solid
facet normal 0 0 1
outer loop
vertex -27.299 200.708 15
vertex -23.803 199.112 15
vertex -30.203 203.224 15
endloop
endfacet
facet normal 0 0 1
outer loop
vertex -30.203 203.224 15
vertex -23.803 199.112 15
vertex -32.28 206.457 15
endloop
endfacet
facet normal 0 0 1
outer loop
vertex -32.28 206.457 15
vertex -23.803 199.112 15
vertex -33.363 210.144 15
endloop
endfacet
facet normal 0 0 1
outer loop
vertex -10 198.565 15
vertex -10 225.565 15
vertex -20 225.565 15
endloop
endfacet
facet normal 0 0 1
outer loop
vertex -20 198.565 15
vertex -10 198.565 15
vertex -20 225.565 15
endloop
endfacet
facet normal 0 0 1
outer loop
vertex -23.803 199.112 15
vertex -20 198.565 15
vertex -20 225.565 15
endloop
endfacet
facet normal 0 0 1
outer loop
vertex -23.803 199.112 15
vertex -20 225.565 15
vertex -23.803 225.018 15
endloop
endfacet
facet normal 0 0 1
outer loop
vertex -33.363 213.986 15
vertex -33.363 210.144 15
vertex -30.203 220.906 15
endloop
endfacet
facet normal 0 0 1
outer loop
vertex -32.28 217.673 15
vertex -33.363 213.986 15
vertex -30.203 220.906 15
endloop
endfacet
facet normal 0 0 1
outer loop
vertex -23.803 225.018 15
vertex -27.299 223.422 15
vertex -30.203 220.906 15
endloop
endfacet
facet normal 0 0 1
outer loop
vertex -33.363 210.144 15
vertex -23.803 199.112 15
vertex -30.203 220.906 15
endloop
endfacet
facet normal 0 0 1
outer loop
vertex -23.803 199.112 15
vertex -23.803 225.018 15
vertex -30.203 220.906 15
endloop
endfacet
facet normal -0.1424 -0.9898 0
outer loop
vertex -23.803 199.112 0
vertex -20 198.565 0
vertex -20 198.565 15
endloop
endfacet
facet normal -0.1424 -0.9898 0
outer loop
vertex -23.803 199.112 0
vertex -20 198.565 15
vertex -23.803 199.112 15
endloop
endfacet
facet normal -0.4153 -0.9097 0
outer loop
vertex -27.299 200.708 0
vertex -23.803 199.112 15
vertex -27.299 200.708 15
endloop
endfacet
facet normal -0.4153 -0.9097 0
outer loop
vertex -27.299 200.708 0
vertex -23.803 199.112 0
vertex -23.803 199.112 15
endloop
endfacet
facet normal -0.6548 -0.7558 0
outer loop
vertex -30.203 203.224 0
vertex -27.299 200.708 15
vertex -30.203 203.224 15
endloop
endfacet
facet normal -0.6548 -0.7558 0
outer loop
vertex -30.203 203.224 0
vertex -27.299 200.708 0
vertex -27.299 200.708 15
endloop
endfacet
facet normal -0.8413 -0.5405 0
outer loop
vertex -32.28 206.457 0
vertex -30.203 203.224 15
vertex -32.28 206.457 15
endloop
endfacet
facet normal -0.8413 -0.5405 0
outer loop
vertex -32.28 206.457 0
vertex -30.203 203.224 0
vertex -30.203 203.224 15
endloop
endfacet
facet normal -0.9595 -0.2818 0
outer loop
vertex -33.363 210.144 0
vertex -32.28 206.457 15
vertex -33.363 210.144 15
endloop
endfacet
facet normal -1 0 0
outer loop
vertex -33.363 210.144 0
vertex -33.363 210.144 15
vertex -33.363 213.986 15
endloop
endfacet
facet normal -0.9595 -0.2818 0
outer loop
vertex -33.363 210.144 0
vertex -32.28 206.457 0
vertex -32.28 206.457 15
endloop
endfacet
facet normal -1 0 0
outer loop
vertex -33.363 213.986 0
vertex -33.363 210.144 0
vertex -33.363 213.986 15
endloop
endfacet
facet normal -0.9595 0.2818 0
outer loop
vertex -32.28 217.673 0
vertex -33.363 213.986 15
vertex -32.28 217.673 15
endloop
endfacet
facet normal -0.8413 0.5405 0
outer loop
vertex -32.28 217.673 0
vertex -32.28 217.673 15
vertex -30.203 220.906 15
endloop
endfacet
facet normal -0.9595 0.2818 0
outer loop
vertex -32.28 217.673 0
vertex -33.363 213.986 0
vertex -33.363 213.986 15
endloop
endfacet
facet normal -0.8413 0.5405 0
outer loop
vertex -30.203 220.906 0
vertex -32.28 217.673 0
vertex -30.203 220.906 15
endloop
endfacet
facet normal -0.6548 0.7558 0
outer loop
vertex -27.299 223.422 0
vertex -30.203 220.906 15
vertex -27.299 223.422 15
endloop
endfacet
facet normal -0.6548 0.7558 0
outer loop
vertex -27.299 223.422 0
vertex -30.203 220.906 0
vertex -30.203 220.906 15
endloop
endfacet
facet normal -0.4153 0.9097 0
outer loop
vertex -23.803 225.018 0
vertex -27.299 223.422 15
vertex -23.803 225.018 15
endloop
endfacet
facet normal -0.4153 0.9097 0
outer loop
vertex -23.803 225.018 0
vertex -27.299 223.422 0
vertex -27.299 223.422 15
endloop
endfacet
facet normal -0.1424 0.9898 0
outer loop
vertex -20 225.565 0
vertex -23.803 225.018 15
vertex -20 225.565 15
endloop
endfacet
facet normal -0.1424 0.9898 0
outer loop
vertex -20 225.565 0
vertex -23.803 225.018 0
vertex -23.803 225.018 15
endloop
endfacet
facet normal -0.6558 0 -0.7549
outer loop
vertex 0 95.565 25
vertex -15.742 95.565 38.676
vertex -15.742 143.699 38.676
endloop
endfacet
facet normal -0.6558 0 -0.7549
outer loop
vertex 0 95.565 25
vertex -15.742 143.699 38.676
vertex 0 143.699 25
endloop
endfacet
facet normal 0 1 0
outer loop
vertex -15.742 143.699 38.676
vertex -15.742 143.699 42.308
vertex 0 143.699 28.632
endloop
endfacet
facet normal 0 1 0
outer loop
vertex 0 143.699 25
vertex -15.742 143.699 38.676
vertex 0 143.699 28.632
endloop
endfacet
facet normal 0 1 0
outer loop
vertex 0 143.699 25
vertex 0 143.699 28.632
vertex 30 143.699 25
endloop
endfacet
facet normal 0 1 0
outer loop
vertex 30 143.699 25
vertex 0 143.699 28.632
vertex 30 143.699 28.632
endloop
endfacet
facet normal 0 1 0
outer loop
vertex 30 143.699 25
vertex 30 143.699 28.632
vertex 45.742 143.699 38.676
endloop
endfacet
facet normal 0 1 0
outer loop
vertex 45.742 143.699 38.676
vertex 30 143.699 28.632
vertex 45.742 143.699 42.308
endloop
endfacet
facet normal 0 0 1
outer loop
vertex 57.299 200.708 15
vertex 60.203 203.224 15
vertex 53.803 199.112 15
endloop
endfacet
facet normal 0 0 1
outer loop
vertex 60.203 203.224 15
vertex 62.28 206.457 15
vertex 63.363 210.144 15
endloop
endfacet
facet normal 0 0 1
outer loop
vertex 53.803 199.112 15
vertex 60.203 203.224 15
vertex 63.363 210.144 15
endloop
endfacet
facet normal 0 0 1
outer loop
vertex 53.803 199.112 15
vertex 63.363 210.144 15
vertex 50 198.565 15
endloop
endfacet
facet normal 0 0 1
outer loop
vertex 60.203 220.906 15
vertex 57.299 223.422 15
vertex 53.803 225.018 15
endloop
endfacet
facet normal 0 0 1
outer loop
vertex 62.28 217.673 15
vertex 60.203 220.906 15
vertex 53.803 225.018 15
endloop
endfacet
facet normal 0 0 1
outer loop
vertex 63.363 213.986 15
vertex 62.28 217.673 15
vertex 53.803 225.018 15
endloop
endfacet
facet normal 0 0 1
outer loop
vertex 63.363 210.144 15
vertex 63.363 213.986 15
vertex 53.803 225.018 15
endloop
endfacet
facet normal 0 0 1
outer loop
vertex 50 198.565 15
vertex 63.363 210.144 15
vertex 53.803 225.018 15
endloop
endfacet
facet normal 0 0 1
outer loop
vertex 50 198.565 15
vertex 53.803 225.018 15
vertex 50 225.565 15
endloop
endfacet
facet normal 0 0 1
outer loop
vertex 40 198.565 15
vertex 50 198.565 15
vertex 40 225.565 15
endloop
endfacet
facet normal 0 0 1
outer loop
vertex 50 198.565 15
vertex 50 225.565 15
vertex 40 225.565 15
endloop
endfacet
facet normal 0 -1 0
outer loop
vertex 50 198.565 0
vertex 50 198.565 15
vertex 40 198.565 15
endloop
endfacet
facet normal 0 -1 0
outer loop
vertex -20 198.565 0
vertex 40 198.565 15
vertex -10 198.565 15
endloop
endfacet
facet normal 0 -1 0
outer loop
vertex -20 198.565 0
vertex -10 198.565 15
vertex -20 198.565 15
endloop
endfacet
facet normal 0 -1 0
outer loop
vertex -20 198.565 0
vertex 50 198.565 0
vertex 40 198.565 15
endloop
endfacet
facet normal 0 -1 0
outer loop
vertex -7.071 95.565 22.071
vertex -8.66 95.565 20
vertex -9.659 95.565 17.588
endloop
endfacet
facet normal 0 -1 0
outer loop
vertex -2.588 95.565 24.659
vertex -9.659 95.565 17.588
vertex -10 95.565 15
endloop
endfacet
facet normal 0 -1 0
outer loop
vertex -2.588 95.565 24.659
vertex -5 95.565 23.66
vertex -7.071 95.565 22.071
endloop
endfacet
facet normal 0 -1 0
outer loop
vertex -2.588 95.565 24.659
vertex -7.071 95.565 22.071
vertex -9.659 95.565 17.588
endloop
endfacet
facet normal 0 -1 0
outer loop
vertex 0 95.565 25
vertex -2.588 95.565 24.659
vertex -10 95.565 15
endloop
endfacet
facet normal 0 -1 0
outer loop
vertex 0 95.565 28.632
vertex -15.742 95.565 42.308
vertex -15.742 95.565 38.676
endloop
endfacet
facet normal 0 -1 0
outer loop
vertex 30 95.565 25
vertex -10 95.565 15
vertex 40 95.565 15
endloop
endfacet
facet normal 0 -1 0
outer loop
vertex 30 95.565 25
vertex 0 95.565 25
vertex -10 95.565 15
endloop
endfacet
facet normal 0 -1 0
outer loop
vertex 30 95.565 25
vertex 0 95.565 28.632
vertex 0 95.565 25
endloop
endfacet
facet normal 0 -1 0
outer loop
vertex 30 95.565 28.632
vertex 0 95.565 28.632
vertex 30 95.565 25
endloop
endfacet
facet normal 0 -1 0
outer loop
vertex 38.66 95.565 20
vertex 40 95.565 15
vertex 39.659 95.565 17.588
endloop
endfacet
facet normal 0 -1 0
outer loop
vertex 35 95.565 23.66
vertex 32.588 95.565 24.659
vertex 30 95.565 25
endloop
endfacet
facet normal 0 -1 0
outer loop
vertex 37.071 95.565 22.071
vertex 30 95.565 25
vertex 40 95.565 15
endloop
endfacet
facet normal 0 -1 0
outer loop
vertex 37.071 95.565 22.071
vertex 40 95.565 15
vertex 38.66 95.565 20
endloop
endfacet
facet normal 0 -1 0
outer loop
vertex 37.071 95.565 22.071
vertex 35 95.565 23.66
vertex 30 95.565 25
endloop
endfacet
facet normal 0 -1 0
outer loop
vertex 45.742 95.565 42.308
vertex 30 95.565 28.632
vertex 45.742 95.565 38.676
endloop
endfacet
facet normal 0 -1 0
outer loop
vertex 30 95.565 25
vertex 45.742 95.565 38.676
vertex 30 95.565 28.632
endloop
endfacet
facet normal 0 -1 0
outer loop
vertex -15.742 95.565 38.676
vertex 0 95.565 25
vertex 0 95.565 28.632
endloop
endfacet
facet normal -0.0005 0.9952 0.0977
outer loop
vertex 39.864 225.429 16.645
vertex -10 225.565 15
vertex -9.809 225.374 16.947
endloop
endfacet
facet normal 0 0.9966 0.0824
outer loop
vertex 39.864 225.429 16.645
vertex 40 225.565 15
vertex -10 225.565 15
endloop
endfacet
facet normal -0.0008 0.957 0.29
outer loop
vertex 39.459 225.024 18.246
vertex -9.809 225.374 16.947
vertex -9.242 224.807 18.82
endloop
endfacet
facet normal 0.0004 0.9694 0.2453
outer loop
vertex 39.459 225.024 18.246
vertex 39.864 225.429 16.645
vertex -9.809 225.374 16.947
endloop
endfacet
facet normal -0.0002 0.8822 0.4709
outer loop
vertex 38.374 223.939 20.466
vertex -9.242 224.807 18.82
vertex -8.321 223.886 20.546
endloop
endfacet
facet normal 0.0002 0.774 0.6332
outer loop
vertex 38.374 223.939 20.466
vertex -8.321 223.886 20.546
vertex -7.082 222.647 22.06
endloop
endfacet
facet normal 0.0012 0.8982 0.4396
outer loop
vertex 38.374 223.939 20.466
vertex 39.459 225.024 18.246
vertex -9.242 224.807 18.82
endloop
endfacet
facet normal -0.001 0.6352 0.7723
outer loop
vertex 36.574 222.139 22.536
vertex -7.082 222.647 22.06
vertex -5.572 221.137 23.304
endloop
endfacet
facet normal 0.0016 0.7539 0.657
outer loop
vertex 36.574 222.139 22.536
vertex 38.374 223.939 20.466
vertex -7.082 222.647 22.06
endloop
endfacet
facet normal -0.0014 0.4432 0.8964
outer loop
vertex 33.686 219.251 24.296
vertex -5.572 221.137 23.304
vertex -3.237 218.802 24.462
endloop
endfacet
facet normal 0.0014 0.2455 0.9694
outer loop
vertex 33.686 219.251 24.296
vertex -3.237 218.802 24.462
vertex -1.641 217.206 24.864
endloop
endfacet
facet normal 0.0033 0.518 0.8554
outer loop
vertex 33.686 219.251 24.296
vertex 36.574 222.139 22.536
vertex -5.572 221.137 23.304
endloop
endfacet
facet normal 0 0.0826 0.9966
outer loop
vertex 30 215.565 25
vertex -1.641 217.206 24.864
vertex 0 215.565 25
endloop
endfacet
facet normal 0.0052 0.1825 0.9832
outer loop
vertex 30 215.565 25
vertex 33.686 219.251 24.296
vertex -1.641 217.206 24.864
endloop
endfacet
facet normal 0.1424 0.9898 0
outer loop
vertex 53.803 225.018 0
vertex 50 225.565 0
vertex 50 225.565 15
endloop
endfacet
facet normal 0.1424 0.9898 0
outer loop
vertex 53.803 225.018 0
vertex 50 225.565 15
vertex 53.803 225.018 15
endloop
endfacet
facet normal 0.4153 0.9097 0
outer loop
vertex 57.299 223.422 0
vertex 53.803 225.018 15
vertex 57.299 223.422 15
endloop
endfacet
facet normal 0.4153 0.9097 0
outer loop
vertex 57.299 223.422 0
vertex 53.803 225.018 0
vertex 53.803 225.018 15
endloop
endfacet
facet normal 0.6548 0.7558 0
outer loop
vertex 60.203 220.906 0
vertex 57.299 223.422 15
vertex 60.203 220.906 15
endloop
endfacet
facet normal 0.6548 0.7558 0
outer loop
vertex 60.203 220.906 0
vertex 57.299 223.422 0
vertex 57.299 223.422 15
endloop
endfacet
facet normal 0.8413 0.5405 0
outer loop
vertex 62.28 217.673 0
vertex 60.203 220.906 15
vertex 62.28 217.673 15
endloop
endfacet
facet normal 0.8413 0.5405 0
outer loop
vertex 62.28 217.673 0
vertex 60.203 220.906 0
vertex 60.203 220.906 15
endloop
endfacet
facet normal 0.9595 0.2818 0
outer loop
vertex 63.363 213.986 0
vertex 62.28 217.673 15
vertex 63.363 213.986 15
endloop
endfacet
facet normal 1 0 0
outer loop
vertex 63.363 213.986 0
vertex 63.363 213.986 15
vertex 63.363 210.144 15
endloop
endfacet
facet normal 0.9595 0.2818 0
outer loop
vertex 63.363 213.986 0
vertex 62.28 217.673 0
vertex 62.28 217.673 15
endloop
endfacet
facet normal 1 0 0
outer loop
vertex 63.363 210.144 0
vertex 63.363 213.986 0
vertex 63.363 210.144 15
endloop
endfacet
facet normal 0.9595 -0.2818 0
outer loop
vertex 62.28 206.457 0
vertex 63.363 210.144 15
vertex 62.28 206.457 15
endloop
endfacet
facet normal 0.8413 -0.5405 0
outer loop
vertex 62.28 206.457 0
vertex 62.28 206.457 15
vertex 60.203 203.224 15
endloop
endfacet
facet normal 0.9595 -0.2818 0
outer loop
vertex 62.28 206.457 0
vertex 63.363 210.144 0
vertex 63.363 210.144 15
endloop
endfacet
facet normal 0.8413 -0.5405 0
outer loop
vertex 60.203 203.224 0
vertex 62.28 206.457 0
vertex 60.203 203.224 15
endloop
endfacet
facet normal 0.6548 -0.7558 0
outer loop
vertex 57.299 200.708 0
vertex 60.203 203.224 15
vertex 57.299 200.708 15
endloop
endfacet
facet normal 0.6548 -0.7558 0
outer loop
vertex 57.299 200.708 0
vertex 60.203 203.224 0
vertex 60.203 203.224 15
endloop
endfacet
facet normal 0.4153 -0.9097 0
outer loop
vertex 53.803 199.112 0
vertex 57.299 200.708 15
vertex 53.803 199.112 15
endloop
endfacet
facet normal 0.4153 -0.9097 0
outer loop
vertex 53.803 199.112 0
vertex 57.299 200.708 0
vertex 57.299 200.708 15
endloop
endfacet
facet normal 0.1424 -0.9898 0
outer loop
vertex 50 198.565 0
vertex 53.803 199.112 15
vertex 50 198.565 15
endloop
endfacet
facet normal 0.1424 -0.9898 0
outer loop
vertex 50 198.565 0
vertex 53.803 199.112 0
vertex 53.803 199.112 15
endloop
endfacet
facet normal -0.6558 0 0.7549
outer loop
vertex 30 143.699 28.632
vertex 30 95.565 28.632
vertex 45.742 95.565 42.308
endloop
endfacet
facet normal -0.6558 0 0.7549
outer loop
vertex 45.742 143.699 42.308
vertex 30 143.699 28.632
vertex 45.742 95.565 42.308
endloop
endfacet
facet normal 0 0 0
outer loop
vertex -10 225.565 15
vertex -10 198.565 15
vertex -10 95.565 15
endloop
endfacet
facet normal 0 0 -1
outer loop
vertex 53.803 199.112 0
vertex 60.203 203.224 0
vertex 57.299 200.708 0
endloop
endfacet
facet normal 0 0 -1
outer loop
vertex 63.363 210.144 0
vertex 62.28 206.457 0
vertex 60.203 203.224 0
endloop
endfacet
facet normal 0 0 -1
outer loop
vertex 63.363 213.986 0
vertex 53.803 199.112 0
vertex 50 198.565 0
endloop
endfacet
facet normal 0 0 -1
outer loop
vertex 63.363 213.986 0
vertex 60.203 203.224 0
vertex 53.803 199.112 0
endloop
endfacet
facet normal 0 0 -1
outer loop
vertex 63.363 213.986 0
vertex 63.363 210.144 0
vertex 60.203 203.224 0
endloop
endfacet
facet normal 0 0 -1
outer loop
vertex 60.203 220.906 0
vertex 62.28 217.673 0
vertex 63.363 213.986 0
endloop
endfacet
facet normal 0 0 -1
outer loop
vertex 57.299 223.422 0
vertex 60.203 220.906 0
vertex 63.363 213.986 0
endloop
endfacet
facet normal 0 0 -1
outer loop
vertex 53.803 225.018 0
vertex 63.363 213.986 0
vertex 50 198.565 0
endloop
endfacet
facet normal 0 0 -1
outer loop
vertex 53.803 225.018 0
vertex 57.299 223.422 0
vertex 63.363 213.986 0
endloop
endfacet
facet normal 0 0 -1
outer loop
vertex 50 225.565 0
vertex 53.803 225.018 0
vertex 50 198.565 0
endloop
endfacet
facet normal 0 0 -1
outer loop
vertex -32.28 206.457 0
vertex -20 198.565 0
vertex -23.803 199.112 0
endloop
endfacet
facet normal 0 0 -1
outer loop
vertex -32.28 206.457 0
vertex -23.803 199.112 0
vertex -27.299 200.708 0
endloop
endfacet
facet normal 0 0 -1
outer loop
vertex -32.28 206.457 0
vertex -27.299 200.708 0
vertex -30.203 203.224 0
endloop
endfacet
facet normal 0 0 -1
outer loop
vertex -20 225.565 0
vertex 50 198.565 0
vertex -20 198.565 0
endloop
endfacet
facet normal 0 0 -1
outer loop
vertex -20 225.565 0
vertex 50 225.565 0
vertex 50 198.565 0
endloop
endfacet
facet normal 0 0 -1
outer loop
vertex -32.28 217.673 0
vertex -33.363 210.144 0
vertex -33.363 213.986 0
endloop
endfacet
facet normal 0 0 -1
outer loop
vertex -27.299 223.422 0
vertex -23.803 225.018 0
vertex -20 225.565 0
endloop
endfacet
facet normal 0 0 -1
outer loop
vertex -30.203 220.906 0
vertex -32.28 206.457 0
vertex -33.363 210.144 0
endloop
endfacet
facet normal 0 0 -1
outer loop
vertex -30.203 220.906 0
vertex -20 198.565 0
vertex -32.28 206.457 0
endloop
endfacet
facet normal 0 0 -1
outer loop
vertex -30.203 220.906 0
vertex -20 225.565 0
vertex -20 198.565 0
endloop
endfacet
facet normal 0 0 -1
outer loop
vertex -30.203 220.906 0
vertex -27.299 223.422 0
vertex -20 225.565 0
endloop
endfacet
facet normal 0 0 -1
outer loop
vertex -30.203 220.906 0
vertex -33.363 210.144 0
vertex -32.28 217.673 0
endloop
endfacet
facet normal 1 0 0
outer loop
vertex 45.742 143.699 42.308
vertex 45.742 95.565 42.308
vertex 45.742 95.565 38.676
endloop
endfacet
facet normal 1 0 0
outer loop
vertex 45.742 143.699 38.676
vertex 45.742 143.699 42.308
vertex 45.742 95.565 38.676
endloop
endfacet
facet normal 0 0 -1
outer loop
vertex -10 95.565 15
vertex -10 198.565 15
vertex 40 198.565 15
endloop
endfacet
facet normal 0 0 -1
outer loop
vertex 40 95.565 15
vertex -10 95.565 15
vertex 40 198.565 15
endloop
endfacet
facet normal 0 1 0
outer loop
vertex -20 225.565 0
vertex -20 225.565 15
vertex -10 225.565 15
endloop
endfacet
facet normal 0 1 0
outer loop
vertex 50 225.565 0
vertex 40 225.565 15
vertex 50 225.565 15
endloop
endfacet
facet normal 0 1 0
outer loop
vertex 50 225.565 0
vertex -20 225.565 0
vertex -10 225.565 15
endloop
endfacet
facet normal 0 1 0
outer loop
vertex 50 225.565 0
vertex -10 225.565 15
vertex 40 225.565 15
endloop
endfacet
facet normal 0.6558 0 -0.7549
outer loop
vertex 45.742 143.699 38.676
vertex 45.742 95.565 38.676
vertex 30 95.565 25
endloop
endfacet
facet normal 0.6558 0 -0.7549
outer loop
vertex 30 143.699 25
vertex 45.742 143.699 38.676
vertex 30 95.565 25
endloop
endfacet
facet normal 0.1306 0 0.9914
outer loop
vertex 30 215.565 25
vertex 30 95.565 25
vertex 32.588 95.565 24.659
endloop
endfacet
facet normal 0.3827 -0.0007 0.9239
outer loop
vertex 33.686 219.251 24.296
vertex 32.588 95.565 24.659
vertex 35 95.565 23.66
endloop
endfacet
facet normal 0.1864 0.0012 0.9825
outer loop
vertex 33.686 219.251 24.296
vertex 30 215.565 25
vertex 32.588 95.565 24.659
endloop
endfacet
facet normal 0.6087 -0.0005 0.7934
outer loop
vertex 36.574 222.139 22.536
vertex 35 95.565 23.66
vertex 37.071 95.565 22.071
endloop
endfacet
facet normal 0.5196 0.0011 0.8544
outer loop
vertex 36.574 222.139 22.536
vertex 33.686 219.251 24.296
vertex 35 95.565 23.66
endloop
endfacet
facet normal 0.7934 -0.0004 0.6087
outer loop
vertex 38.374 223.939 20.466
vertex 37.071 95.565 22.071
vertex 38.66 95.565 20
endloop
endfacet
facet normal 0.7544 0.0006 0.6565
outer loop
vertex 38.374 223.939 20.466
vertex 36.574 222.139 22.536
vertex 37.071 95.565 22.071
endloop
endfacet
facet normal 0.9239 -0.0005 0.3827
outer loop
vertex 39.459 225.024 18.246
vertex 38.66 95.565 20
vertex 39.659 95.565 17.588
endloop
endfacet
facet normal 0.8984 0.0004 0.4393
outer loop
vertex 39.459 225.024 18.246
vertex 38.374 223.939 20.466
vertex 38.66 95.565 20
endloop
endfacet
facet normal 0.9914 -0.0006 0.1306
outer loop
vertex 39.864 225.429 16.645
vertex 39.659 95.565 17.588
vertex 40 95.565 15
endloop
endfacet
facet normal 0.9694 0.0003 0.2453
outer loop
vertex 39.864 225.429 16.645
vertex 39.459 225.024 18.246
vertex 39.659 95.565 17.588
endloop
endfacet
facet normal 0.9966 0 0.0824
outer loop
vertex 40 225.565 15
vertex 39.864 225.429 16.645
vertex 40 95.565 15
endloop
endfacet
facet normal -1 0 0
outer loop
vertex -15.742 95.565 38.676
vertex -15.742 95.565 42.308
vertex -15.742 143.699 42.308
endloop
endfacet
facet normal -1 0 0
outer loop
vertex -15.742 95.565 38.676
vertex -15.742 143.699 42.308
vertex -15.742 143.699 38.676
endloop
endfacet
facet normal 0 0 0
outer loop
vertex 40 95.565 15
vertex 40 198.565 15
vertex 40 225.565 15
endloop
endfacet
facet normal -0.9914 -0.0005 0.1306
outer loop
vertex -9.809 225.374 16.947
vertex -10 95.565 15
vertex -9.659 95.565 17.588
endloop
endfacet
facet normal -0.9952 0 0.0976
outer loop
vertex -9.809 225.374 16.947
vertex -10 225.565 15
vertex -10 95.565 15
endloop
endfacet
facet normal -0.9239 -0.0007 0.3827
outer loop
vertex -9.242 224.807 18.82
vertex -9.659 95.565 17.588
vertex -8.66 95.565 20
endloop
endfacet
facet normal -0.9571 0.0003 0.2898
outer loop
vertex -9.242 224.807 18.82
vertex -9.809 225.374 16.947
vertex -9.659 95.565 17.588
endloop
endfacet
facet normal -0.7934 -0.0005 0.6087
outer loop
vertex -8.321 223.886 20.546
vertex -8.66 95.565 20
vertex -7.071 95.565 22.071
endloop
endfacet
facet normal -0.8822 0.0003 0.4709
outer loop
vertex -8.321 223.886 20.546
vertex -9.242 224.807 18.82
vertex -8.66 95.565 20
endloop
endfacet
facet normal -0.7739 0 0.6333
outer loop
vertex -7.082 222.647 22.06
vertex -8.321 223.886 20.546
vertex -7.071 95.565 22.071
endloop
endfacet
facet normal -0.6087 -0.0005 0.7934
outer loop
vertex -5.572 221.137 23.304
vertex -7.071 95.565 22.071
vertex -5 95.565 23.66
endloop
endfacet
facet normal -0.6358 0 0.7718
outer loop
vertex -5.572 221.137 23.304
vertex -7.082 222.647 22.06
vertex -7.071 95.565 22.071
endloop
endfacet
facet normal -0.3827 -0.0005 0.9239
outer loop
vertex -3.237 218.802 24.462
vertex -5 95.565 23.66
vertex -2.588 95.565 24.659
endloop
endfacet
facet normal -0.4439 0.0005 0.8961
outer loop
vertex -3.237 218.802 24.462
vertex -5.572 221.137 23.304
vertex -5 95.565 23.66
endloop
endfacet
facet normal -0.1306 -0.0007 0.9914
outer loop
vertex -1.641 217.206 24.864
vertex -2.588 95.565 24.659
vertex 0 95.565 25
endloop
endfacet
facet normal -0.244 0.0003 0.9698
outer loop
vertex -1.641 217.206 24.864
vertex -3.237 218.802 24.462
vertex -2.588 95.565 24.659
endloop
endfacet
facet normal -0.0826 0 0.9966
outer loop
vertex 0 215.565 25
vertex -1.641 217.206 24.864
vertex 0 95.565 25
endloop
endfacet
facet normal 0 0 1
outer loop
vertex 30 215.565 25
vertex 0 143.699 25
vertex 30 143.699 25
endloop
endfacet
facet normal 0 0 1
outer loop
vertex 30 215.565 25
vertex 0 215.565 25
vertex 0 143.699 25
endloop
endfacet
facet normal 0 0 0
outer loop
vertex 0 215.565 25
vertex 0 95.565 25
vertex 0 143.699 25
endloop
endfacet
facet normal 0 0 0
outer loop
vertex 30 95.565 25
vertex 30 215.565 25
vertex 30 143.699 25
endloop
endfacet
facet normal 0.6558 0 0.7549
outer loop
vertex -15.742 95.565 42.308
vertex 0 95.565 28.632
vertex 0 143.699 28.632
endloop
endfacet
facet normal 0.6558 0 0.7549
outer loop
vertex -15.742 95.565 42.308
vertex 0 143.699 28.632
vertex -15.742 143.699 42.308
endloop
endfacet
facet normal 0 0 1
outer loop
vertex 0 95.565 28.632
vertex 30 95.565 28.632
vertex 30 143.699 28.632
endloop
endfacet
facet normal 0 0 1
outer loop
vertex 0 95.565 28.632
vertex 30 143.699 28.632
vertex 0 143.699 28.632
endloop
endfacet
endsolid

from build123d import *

# Parameters (mm, degrees)
EXTRUDE1_DEPTH = 15
SKETCH2_W      = 50
SKETCH2_H      = 130
EXTRUDE2_DEPTH = 10
FILLET1_R      = 10
SKETCH3_W      = 30
SKETCH3_H      = 48.133793791
EXTRUDE3_DEPTH = 8
SKETCH4_W      = 15
SKETCH4_H      = 3.631833837
EXTRUDE4_DEPTH = 48.133793792


with BuildPart() as part:
    # Sketch1 → Extrude1 (new body)
    with BuildSketch(Plane.XY):
        with BuildLine():
            Line((50, 198.565015772), (-20, 198.565015772))
            ThreePointArc((-20, 198.565015772), (-33.5, 212.065015772), (-20, 225.565015772))
            Line((-20, 225.565015772), (50, 225.565015772))
            ThreePointArc((50, 225.565015772), (63.5, 212.065015772), (50, 198.565015772))
        make_face()
    extrude(amount=EXTRUDE1_DEPTH)

    # Sketch2 → Extrude2 (add)
    with BuildSketch(Plane.XY.offset(15)):
        with Locations((15, 160.565015772)):
            Rectangle(SKETCH2_W, SKETCH2_H)
    extrude(amount=EXTRUDE2_DEPTH)

    # Fillet1
    fillet1_edges = [part.edges().sort_by_distance(p)[0] for p in [
        (40, 160.565015772, 25),
        (-10, 160.565015772, 25),
        (15, 225.565015772, 25),
    ]]
    fillet(fillet1_edges, radius=FILLET1_R - 0.0001)  # a hair under: the kernel refuses the full size

    # Sketch3 → Extrude3 (cut)
    with BuildSketch(Plane.XY.offset(25)):
        with Locations((15, 119.631912668)):
            Rectangle(SKETCH3_W, SKETCH3_H)
    extrude(amount=-EXTRUDE3_DEPTH, mode=Mode.SUBTRACT)

    # Sketch4 → Extrude4 (add)
    with BuildSketch(Plane.XZ.offset(-143.698809563)):
        Polygon((30, 17), (30, 25), (15, 25), (0, 25), (0, 17), align=None)
        with Locations((22.5, 26.815916919)):
            Rectangle(SKETCH4_W, SKETCH4_H)
        with Locations((7.5, 26.815916919)):
            Rectangle(SKETCH4_W, SKETCH4_H)
        Polygon((0, 25), (0, 28.631833837), (-15.741772737, 42.308009261), (-15.741772737, 38.676175424), align=None)
        Polygon((45.741772737, 42.308009261), (45.741772737, 38.676175424), (30, 25), (30, 28.631833837), align=None)
    extrude(amount=EXTRUDE4_DEPTH)


solid = part.part
